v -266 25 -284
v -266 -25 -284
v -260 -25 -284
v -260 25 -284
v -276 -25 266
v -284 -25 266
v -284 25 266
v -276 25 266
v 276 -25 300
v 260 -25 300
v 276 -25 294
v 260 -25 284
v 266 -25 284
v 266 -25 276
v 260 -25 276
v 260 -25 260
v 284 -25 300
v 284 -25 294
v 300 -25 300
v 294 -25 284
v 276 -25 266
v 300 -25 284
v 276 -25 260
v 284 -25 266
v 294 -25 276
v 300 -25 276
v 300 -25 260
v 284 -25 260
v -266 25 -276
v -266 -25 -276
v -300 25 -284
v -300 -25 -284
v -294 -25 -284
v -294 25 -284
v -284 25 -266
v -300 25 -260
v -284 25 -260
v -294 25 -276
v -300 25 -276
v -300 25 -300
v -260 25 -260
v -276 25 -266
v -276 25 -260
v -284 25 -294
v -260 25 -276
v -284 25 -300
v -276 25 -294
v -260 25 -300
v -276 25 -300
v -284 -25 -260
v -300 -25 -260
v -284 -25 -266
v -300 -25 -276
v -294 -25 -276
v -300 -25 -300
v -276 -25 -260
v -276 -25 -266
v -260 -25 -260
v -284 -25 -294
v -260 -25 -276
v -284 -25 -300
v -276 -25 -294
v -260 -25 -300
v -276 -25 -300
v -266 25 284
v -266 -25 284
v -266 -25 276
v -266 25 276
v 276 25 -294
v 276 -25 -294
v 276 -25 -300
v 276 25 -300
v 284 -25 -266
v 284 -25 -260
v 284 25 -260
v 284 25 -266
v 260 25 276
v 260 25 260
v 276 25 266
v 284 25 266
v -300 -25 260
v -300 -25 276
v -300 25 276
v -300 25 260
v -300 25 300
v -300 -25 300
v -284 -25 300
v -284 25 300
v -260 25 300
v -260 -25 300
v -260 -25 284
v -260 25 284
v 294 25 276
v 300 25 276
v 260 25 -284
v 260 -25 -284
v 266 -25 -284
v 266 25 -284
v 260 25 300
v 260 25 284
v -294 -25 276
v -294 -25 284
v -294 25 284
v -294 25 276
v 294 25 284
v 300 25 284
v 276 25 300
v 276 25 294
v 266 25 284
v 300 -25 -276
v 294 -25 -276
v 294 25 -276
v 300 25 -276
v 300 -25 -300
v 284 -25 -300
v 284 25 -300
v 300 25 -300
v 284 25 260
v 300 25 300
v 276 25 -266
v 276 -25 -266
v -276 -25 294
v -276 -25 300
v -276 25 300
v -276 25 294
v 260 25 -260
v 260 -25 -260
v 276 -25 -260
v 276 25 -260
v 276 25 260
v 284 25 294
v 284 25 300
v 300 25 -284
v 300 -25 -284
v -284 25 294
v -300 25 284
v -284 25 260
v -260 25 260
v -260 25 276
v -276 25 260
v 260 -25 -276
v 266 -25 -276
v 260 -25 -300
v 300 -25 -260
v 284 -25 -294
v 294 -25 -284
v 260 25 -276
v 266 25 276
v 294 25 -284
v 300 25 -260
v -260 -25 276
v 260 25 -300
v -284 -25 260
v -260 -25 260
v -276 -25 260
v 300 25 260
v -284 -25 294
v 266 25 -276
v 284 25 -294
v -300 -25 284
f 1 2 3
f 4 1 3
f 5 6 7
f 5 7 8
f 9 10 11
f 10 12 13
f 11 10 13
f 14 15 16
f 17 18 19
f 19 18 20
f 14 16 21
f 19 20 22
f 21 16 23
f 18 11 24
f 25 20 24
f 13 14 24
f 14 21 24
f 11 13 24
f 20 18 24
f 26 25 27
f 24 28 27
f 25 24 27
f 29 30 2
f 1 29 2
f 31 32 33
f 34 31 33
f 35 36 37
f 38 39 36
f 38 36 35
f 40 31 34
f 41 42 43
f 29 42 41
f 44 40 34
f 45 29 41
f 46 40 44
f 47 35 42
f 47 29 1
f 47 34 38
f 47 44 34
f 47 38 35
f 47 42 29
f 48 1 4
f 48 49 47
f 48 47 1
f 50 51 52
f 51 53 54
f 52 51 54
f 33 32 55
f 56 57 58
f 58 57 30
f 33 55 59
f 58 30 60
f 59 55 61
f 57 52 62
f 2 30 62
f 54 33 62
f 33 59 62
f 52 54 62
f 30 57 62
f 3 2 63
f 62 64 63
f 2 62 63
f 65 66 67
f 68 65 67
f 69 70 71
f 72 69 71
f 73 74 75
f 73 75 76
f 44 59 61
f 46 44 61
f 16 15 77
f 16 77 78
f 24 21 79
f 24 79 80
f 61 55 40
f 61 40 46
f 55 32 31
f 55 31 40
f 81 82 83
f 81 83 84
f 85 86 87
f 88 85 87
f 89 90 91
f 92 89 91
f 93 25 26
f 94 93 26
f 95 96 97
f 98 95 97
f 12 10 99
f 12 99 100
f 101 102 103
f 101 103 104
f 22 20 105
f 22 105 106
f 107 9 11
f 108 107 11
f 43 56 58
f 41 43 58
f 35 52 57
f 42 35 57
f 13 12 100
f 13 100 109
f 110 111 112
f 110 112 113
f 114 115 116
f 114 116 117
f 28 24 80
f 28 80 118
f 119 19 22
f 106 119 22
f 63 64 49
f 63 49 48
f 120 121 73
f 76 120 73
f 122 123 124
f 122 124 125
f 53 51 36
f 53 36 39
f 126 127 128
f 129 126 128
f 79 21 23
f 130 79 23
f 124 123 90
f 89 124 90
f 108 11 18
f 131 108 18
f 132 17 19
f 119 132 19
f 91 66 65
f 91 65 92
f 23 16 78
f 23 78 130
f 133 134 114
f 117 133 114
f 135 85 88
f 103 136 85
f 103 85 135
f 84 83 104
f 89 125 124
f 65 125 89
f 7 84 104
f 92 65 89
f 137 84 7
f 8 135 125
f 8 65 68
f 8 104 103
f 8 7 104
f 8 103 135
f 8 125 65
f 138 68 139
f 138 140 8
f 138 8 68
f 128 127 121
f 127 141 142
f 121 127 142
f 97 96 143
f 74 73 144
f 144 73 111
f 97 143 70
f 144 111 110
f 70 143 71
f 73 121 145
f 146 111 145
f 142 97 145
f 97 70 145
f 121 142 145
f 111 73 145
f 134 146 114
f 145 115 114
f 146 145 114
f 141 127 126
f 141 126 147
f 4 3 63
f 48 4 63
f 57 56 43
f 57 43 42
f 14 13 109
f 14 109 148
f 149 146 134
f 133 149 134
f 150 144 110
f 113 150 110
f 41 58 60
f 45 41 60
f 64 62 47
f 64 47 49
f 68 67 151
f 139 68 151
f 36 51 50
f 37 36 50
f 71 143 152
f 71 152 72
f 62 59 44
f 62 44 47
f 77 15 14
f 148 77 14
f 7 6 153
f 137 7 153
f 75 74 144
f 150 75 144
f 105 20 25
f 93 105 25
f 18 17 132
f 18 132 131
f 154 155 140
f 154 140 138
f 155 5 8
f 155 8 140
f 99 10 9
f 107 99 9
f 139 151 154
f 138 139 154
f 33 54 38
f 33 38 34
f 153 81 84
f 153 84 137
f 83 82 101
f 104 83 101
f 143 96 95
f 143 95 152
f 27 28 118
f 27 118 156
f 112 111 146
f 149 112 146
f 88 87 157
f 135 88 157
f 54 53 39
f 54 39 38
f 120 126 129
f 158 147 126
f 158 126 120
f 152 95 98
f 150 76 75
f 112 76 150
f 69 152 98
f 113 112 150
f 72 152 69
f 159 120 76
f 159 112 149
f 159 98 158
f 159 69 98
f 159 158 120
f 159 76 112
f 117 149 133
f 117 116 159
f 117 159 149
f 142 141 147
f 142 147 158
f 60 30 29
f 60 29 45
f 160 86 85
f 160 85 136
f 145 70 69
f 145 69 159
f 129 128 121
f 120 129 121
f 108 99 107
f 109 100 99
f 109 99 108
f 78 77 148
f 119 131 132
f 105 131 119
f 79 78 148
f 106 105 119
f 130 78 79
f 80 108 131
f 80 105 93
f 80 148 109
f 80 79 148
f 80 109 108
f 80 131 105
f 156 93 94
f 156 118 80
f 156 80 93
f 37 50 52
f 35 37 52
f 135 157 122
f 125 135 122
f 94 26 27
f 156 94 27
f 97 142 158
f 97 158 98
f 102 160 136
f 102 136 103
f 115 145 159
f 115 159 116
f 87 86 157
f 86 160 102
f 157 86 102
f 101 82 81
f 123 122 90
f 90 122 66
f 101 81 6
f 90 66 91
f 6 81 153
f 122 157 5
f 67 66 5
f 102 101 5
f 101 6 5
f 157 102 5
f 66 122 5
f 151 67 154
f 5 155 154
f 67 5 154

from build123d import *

# Parameters (mm, degrees)
BOSS_EXTRUDE1_DEPTH        = 25
BOSS_EXTRUDE1_DEPTH_BACK   = 25
SKETCH2_W                  = 40
SKETCH2_H                  = 40
BOSS_EXTRUDE1_2_DEPTH      = 25
BOSS_EXTRUDE1_2_DEPTH_BACK = 25
BOSS_EXTRUDE1_3_DEPTH      = 25
BOSS_EXTRUDE1_3_DEPTH_BACK = 25
BOSS_EXTRUDE1_4_DEPTH      = 25
BOSS_EXTRUDE1_4_DEPTH_BACK = 25
CUT_EXTRUDE1_DEPTH         = 426
CUT_EXTRUDE1_DEPTH_BACK    = 426
SKETCH3_W                  = 12
SKETCH3_H                  = 8
SKETCH3_W_2                = 8
SKETCH3_H_2                = 12


with BuildPart() as part:
    # Sketch2 → Boss-Extrude1 (new, two sides: drawn at the far end of the back side and taken through both)
    with BuildSketch(Plane(origin=(0, 0, 0), x_dir=(1, 0, 0), z_dir=(0, 1, 0)).offset(-BOSS_EXTRUDE1_DEPTH_BACK)):
        with Locations((-280, 280)):
            Rectangle(SKETCH2_W, SKETCH2_H)
    extrude(amount=BOSS_EXTRUDE1_DEPTH + BOSS_EXTRUDE1_DEPTH_BACK)


with BuildPart() as body_2:
    # Sketch2 → Boss-Extrude1 2 (new, two sides: drawn at the far end of the back side and taken through both)
    with BuildSketch(Plane(origin=(0, 0, 0), x_dir=(1, 0, 0), z_dir=(0, 1, 0)).offset(-BOSS_EXTRUDE1_2_DEPTH_BACK)):
        with Locations((280, 280)):
            Rectangle(SKETCH2_W, SKETCH2_H)
    extrude(amount=BOSS_EXTRUDE1_2_DEPTH + BOSS_EXTRUDE1_2_DEPTH_BACK)


with BuildPart() as body_3:
    # Sketch2 → Boss-Extrude1 3 (new, two sides: drawn at the far end of the back side and taken through both)
    with BuildSketch(Plane(origin=(0, 0, 0), x_dir=(1, 0, 0), z_dir=(0, 1, 0)).offset(-BOSS_EXTRUDE1_3_DEPTH_BACK)):
        with Locations((280, -280)):
            Rectangle(SKETCH2_W, SKETCH2_H)
    extrude(amount=BOSS_EXTRUDE1_3_DEPTH + BOSS_EXTRUDE1_3_DEPTH_BACK)


with BuildPart() as body_4:
    # Sketch2 → Boss-Extrude1 4 (new, two sides: drawn at the far end of the back side and taken through both)
    with BuildSketch(Plane(origin=(0, 0, 0), x_dir=(1, 0, 0), z_dir=(0, 1, 0)).offset(-BOSS_EXTRUDE1_4_DEPTH_BACK)):
        with Locations((-280, -280)):
            Rectangle(SKETCH2_W, SKETCH2_H)
    extrude(amount=BOSS_EXTRUDE1_4_DEPTH + BOSS_EXTRUDE1_4_DEPTH_BACK)


with BuildPart() as cut_extrude1_tool:
    # Sketch3 → Cut-Extrude1 (new, two sides: drawn at the far end of the back side and taken through both)
    with BuildSketch(Plane(origin=(0, 0, 0), x_dir=(1, 0, 0), z_dir=(0, 1, 0)).offset(-CUT_EXTRUDE1_DEPTH_BACK)):
        with Locations((-260, 280)):
            Rectangle(SKETCH3_W, SKETCH3_H)
        with Locations((-280, 300)):
            Rectangle(SKETCH3_W_2, SKETCH3_H_2)
        with Locations((-280, 260)):
            Rectangle(SKETCH3_W_2, SKETCH3_H_2)
        with Locations((-300, 280)):
            Rectangle(SKETCH3_W, SKETCH3_H)
        with Locations((300, 280)):
            Rectangle(SKETCH3_W, SKETCH3_H)
        with Locations((280, 260)):
            Rectangle(SKETCH3_W_2, SKETCH3_H_2)
        with Locations((260, 280)):
            Rectangle(SKETCH3_W, SKETCH3_H)
        with Locations((280, 300)):
            Rectangle(SKETCH3_W_2, SKETCH3_H_2)
        with Locations((260, -280)):
            Rectangle(SKETCH3_W, SKETCH3_H)
        with Locations((280, -300)):
            Rectangle(SKETCH3_W_2, SKETCH3_H_2)
        with Locations((280, -260)):
            Rectangle(SKETCH3_W_2, SKETCH3_H_2)
        with Locations((300, -280)):
            Rectangle(SKETCH3_W, SKETCH3_H)
        with Locations((-300, -280)):
            Rectangle(SKETCH3_W, SKETCH3_H)
        with Locations((-280, -260)):
            Rectangle(SKETCH3_W_2, SKETCH3_H_2)
        with Locations((-260, -280)):
            Rectangle(SKETCH3_W, SKETCH3_H)
        with Locations((-280, -300)):
            Rectangle(SKETCH3_W_2, SKETCH3_H_2)
    extrude(amount=CUT_EXTRUDE1_DEPTH + CUT_EXTRUDE1_DEPTH_BACK)


with BuildPart() as part_1:
    add(part.part)

    # Cut-Extrude1: cut by cut_extrude1_tool
    add(cut_extrude1_tool.part, mode=Mode.SUBTRACT)


with BuildPart() as body_2_1:
    add(body_2.part)

    # Cut-Extrude1: cut by cut_extrude1_tool
    add(cut_extrude1_tool.part, mode=Mode.SUBTRACT)


with BuildPart() as body_3_1:
    add(body_3.part)

    # Cut-Extrude1: cut by cut_extrude1_tool
    add(cut_extrude1_tool.part, mode=Mode.SUBTRACT)


with BuildPart() as body_4_1:
    add(body_4.part)

    # Cut-Extrude1: cut by cut_extrude1_tool
    add(cut_extrude1_tool.part, mode=Mode.SUBTRACT)


solid = Compound([part_1.part, body_2_1.part, body_3_1.part, body_4_1.part])
